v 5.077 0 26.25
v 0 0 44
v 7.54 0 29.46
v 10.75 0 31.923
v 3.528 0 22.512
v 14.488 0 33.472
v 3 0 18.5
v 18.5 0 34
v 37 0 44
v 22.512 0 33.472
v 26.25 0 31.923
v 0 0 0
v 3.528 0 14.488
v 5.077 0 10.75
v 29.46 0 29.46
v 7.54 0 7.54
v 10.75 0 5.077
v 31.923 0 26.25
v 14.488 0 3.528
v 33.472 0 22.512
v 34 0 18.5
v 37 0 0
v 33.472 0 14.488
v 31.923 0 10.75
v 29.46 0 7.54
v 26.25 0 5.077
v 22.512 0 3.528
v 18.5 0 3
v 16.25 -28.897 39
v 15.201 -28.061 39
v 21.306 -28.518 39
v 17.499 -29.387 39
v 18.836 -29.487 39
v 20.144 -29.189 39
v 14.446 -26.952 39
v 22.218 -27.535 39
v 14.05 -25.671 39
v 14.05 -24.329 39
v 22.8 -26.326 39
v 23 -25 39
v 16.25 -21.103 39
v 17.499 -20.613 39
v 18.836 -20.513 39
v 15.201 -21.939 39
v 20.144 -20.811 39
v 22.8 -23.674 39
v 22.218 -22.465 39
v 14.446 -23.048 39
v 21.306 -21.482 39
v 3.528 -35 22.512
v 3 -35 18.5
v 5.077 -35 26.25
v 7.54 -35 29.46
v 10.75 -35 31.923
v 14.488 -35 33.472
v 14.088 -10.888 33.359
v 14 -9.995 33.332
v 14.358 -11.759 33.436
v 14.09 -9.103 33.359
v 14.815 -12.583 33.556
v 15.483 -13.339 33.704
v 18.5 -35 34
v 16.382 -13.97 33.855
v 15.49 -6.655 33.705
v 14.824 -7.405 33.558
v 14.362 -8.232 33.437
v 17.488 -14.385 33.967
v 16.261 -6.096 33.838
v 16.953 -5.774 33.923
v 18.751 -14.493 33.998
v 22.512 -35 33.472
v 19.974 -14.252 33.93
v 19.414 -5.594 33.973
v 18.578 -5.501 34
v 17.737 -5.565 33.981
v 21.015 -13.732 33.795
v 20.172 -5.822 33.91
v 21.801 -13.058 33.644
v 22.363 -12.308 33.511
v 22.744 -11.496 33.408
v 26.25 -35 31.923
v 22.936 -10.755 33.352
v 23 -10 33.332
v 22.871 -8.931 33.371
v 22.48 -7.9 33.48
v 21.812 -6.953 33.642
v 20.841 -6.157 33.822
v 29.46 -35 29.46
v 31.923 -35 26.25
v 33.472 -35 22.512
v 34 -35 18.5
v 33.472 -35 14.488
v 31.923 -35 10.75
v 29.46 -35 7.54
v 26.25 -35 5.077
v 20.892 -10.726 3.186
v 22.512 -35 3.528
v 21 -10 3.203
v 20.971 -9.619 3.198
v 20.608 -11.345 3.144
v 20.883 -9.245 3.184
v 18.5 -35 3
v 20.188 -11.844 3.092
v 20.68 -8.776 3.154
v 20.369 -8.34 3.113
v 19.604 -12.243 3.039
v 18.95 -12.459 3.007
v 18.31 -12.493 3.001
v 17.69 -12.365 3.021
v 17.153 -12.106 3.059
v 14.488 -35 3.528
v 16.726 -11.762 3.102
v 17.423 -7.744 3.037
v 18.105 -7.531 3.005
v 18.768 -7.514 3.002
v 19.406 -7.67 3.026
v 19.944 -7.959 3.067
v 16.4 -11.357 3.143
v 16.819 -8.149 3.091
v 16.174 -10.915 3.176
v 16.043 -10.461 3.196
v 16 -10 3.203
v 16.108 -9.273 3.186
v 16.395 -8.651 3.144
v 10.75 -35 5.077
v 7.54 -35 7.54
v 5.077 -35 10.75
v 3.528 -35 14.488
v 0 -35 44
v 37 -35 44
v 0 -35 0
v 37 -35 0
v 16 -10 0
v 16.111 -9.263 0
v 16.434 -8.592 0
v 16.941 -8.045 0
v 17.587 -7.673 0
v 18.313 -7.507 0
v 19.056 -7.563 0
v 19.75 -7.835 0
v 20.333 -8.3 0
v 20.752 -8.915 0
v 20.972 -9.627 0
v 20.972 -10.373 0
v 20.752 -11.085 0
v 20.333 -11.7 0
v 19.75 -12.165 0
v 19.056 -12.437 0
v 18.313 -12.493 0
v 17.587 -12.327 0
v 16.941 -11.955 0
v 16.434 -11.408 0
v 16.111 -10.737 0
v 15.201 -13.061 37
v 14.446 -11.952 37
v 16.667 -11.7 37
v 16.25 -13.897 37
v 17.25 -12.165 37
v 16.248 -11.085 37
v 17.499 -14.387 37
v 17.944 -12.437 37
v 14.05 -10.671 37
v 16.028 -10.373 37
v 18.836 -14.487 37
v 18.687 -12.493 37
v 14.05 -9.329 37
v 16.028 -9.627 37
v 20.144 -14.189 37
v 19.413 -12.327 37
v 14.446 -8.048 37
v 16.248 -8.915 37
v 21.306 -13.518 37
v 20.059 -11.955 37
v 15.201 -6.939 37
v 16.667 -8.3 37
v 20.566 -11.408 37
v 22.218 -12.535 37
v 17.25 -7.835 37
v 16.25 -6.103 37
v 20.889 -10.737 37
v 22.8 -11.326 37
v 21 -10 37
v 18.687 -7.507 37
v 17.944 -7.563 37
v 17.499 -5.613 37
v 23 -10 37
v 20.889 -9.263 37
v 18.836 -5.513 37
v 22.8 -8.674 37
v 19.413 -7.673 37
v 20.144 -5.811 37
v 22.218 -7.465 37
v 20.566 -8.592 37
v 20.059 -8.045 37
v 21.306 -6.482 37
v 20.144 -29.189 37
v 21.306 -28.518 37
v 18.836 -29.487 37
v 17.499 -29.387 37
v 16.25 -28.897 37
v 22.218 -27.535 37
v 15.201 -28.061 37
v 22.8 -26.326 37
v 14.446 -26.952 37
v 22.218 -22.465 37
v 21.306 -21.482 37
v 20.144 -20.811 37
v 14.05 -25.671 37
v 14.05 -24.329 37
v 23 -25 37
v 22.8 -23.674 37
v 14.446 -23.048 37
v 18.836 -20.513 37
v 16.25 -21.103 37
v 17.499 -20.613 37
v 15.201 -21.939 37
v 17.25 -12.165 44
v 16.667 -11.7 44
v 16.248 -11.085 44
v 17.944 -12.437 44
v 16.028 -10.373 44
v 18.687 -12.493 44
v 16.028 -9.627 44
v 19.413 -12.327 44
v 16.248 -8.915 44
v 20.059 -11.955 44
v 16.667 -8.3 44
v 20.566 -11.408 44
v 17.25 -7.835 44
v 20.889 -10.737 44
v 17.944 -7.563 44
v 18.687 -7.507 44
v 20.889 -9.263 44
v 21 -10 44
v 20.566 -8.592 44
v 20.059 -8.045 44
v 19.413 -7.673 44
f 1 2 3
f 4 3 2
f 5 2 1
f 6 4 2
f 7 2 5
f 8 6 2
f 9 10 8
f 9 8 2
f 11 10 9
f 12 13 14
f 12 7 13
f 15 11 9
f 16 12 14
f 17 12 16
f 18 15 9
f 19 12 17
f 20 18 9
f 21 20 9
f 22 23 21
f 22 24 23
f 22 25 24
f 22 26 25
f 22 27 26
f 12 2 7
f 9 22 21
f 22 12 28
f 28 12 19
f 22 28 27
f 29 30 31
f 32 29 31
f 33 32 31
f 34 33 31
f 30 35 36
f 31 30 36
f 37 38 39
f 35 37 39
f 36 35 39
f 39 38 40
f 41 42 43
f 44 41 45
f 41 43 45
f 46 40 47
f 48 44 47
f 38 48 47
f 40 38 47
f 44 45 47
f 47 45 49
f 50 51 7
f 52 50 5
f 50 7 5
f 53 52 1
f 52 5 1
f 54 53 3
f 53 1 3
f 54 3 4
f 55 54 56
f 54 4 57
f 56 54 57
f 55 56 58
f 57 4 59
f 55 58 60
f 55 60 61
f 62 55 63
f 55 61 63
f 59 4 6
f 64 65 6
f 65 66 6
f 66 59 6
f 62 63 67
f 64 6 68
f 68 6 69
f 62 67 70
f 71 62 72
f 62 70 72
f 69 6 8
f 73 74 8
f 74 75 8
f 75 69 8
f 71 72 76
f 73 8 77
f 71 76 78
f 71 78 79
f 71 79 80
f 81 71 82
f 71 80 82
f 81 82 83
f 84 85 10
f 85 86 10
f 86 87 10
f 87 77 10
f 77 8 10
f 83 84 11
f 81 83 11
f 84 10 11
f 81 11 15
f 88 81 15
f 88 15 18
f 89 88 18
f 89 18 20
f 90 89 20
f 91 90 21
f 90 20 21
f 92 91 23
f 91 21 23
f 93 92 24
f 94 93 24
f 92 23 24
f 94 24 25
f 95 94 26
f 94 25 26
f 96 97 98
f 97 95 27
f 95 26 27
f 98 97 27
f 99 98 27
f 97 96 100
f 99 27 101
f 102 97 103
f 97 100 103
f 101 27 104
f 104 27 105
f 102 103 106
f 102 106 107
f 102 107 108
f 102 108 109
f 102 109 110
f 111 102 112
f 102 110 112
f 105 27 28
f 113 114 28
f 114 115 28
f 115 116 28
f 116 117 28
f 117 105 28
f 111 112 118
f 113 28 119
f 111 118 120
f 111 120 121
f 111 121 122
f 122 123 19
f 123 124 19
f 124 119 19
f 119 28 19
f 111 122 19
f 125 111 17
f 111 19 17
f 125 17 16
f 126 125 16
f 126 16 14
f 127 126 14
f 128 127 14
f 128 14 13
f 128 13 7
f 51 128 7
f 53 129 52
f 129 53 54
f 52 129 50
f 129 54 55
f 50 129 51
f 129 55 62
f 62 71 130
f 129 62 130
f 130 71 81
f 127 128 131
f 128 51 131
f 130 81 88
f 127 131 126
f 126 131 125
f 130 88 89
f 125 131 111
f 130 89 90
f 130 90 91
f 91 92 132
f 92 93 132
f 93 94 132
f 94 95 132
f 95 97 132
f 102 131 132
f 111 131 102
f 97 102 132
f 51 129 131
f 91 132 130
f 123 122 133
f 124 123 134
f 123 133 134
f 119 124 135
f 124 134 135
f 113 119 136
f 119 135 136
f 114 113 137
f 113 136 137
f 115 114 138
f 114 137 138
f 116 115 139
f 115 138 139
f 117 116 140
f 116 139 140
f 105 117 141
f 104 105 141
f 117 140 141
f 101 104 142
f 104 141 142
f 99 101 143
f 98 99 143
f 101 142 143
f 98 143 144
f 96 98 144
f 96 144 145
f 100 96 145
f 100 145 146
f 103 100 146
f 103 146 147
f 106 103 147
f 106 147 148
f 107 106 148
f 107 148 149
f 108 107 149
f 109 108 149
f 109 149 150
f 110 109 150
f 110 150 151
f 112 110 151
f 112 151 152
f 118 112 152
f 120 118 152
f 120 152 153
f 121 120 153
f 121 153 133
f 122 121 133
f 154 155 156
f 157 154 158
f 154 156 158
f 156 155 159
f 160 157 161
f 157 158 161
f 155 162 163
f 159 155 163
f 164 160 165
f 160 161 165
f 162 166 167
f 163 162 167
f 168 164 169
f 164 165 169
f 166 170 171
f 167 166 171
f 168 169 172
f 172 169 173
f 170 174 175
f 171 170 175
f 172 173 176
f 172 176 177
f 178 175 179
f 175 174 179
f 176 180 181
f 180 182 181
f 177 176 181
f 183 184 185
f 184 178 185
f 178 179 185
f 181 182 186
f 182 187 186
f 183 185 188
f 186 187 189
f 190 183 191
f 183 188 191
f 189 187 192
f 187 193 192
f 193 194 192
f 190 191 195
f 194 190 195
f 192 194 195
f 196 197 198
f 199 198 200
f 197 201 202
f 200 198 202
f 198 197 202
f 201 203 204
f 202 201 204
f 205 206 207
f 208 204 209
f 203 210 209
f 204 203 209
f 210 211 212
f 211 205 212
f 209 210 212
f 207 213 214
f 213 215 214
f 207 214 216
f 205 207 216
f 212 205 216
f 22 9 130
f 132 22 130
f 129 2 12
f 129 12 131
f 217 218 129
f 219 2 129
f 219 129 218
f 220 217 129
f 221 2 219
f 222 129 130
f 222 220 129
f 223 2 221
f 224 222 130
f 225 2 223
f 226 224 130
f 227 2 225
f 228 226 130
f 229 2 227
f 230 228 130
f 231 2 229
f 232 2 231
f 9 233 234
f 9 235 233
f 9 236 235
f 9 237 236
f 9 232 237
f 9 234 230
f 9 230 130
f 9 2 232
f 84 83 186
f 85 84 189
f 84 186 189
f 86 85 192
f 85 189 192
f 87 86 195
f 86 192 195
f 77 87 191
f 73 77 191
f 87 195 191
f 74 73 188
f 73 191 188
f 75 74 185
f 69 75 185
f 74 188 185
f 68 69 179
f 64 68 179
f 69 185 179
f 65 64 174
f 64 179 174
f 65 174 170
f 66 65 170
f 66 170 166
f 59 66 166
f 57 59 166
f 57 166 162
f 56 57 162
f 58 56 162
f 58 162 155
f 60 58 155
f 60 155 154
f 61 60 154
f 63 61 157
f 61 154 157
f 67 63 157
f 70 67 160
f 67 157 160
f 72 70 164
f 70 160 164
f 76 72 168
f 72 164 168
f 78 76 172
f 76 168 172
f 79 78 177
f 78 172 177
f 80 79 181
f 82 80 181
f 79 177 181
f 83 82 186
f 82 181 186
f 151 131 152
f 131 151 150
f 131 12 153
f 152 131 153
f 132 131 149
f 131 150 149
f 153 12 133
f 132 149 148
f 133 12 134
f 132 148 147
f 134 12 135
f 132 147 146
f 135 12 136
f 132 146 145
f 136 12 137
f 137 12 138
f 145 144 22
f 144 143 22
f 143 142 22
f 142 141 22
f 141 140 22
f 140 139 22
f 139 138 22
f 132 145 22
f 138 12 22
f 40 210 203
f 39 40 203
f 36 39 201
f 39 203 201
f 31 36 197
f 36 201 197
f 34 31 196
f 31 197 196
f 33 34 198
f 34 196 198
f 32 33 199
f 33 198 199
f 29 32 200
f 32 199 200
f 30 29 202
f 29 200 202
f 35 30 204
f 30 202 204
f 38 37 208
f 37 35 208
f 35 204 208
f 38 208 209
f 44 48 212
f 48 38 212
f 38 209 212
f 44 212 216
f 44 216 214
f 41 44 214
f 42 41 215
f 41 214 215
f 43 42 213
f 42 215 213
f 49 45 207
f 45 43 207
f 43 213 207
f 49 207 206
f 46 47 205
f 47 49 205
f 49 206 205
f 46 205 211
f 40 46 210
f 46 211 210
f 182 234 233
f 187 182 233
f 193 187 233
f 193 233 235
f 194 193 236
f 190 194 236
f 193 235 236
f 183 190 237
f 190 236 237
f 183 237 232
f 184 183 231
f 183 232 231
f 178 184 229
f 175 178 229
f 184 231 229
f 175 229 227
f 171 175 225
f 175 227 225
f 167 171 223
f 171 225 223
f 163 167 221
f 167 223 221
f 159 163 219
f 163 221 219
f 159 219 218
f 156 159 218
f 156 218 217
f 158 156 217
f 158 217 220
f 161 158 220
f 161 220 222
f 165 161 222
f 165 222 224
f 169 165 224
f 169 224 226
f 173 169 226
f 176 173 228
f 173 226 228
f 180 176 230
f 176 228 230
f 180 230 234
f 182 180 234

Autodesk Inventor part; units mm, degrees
ref_plane "YZ Plane" through (0, 0, 0) normal (1, 0, 0) x (0, 1, 0)
ref_plane "XZ Plane" through (0, 0, 0) normal (0, 1, 0) x (-1, 0, 0)
ref_plane "XY Plane" through (0, 0, 0) normal (0, 0, 1) x (1, 0, 0)
sketch "Sketch1" plane through (0, 0, 0) normal (0, 1, 0) x (-1, 0, 0)
  line L0 (0, 0) -> (-37, 0)
  line L1 (-37, 0) -> (-37, 37)
  line L2 (-37, 37) -> (0, 37)
  line L3 (0, 37) -> (0, 0)
  circle A0 centre (-18.5, 18.5) radius 15.5
  point P0 (-18.5, 0)
  dimension "d0" = 37
  dimension "d1" = 37
  dimension "d2" = 18.5
  dimension "d3" = 18.5
  dimension "d4" = 31
extrude "Extrusion1" add sketch "Sketch1" against normal blind 35
sketch "Sketch3" plane through (0, 0, 37) normal (0, 0, 1) x (1, 0, 0)
  circle A0 centre (18.5, -10) radius 4.5
  line L0 (37, 0) -> (37, -35) projected
  point P0 (0, 0)
  dimension "d8" = 9
  dimension "d18" = 18.5
extrude "Extrusion2" cut sketch "Sketch3" against normal blind 5
sketch "Sketch4" plane through (37, 0, 0) normal (0, 0, -1) x (-1, 0, 0)
  circle A0 centre (18.5, -10) radius 4.5 projected
  circle A1 centre (18.5, -10) radius 2.5
  point P0 (37, 0)
  dimension "d11" = 5
extrude "Extrusion3" cut sketch "Sketch4" against normal blind 5 contours A1
sketch "Sketch5" plane through (0, 0, 37) normal (0, 0, 1) x (1, 0, 0)
  line L0 (37, 0) -> (0, 0) projected
  line L1 (0, -35) -> (37, -35) projected
  line L2 (0, 0) -> (37, 0)
  line L3 (37, 0) -> (37, -35)
  line L4 (37, -35) -> (0, -35)
  line L5 (0, -35) -> (0, 0)
  line L6 (0, 0) -> (0, -35) projected
  line L7 (0, 0) -> (37, 0)
  line L8 (37, 0) -> (37, -35)
  line L9 (37, -35) -> (0, -35)
  line L10 (0, -35) -> (0, 0)
  circle A0 centre (18.5, -25) radius 4.5
  dimension "d19" = 18.5
  dimension "d22" = 10
extrude "Extrusion4" add sketch "Sketch5" along normal blind 2
sketch "Sketch6" plane through (0, 0, 39) normal (0, 0, 1) x (1, 0, 0)
  line L0 (0, 0) -> (0, -35) projected
  line L1 (0, -35) -> (37, -35) projected
  line L2 (0, 0) -> (37, 0)
  line L3 (37, 0) -> (37, -35)
  line L4 (37, -35) -> (0, -35)
  line L5 (0, -35) -> (0, 0)
extrude "Extrusion5" add sketch "Sketch6" along normal blind 5
sketch "Sketch7" plane through (0, 0, 44) normal (0, 0, 1) x (1, 0, 0)
  circle A0 centre (18.5, -10) radius 2.5
  line L0 (37, 0) -> (0, 0) projected
  line L1 (37, -35) -> (37, 0) projected
  point P0 (18.5, 0)
  dimension "d24" = 5
  dimension "d25" = 10
  dimension "d26" = 18.5
extrude "Extrusion6" cut sketch "Sketch7" against normal through all
equation "\"d0\" = d1"
equation "\"d2\" = 0.5 * d1"
equation "\"d3\" = 0.5 * d0"
properties part number "welco mount v03b"
